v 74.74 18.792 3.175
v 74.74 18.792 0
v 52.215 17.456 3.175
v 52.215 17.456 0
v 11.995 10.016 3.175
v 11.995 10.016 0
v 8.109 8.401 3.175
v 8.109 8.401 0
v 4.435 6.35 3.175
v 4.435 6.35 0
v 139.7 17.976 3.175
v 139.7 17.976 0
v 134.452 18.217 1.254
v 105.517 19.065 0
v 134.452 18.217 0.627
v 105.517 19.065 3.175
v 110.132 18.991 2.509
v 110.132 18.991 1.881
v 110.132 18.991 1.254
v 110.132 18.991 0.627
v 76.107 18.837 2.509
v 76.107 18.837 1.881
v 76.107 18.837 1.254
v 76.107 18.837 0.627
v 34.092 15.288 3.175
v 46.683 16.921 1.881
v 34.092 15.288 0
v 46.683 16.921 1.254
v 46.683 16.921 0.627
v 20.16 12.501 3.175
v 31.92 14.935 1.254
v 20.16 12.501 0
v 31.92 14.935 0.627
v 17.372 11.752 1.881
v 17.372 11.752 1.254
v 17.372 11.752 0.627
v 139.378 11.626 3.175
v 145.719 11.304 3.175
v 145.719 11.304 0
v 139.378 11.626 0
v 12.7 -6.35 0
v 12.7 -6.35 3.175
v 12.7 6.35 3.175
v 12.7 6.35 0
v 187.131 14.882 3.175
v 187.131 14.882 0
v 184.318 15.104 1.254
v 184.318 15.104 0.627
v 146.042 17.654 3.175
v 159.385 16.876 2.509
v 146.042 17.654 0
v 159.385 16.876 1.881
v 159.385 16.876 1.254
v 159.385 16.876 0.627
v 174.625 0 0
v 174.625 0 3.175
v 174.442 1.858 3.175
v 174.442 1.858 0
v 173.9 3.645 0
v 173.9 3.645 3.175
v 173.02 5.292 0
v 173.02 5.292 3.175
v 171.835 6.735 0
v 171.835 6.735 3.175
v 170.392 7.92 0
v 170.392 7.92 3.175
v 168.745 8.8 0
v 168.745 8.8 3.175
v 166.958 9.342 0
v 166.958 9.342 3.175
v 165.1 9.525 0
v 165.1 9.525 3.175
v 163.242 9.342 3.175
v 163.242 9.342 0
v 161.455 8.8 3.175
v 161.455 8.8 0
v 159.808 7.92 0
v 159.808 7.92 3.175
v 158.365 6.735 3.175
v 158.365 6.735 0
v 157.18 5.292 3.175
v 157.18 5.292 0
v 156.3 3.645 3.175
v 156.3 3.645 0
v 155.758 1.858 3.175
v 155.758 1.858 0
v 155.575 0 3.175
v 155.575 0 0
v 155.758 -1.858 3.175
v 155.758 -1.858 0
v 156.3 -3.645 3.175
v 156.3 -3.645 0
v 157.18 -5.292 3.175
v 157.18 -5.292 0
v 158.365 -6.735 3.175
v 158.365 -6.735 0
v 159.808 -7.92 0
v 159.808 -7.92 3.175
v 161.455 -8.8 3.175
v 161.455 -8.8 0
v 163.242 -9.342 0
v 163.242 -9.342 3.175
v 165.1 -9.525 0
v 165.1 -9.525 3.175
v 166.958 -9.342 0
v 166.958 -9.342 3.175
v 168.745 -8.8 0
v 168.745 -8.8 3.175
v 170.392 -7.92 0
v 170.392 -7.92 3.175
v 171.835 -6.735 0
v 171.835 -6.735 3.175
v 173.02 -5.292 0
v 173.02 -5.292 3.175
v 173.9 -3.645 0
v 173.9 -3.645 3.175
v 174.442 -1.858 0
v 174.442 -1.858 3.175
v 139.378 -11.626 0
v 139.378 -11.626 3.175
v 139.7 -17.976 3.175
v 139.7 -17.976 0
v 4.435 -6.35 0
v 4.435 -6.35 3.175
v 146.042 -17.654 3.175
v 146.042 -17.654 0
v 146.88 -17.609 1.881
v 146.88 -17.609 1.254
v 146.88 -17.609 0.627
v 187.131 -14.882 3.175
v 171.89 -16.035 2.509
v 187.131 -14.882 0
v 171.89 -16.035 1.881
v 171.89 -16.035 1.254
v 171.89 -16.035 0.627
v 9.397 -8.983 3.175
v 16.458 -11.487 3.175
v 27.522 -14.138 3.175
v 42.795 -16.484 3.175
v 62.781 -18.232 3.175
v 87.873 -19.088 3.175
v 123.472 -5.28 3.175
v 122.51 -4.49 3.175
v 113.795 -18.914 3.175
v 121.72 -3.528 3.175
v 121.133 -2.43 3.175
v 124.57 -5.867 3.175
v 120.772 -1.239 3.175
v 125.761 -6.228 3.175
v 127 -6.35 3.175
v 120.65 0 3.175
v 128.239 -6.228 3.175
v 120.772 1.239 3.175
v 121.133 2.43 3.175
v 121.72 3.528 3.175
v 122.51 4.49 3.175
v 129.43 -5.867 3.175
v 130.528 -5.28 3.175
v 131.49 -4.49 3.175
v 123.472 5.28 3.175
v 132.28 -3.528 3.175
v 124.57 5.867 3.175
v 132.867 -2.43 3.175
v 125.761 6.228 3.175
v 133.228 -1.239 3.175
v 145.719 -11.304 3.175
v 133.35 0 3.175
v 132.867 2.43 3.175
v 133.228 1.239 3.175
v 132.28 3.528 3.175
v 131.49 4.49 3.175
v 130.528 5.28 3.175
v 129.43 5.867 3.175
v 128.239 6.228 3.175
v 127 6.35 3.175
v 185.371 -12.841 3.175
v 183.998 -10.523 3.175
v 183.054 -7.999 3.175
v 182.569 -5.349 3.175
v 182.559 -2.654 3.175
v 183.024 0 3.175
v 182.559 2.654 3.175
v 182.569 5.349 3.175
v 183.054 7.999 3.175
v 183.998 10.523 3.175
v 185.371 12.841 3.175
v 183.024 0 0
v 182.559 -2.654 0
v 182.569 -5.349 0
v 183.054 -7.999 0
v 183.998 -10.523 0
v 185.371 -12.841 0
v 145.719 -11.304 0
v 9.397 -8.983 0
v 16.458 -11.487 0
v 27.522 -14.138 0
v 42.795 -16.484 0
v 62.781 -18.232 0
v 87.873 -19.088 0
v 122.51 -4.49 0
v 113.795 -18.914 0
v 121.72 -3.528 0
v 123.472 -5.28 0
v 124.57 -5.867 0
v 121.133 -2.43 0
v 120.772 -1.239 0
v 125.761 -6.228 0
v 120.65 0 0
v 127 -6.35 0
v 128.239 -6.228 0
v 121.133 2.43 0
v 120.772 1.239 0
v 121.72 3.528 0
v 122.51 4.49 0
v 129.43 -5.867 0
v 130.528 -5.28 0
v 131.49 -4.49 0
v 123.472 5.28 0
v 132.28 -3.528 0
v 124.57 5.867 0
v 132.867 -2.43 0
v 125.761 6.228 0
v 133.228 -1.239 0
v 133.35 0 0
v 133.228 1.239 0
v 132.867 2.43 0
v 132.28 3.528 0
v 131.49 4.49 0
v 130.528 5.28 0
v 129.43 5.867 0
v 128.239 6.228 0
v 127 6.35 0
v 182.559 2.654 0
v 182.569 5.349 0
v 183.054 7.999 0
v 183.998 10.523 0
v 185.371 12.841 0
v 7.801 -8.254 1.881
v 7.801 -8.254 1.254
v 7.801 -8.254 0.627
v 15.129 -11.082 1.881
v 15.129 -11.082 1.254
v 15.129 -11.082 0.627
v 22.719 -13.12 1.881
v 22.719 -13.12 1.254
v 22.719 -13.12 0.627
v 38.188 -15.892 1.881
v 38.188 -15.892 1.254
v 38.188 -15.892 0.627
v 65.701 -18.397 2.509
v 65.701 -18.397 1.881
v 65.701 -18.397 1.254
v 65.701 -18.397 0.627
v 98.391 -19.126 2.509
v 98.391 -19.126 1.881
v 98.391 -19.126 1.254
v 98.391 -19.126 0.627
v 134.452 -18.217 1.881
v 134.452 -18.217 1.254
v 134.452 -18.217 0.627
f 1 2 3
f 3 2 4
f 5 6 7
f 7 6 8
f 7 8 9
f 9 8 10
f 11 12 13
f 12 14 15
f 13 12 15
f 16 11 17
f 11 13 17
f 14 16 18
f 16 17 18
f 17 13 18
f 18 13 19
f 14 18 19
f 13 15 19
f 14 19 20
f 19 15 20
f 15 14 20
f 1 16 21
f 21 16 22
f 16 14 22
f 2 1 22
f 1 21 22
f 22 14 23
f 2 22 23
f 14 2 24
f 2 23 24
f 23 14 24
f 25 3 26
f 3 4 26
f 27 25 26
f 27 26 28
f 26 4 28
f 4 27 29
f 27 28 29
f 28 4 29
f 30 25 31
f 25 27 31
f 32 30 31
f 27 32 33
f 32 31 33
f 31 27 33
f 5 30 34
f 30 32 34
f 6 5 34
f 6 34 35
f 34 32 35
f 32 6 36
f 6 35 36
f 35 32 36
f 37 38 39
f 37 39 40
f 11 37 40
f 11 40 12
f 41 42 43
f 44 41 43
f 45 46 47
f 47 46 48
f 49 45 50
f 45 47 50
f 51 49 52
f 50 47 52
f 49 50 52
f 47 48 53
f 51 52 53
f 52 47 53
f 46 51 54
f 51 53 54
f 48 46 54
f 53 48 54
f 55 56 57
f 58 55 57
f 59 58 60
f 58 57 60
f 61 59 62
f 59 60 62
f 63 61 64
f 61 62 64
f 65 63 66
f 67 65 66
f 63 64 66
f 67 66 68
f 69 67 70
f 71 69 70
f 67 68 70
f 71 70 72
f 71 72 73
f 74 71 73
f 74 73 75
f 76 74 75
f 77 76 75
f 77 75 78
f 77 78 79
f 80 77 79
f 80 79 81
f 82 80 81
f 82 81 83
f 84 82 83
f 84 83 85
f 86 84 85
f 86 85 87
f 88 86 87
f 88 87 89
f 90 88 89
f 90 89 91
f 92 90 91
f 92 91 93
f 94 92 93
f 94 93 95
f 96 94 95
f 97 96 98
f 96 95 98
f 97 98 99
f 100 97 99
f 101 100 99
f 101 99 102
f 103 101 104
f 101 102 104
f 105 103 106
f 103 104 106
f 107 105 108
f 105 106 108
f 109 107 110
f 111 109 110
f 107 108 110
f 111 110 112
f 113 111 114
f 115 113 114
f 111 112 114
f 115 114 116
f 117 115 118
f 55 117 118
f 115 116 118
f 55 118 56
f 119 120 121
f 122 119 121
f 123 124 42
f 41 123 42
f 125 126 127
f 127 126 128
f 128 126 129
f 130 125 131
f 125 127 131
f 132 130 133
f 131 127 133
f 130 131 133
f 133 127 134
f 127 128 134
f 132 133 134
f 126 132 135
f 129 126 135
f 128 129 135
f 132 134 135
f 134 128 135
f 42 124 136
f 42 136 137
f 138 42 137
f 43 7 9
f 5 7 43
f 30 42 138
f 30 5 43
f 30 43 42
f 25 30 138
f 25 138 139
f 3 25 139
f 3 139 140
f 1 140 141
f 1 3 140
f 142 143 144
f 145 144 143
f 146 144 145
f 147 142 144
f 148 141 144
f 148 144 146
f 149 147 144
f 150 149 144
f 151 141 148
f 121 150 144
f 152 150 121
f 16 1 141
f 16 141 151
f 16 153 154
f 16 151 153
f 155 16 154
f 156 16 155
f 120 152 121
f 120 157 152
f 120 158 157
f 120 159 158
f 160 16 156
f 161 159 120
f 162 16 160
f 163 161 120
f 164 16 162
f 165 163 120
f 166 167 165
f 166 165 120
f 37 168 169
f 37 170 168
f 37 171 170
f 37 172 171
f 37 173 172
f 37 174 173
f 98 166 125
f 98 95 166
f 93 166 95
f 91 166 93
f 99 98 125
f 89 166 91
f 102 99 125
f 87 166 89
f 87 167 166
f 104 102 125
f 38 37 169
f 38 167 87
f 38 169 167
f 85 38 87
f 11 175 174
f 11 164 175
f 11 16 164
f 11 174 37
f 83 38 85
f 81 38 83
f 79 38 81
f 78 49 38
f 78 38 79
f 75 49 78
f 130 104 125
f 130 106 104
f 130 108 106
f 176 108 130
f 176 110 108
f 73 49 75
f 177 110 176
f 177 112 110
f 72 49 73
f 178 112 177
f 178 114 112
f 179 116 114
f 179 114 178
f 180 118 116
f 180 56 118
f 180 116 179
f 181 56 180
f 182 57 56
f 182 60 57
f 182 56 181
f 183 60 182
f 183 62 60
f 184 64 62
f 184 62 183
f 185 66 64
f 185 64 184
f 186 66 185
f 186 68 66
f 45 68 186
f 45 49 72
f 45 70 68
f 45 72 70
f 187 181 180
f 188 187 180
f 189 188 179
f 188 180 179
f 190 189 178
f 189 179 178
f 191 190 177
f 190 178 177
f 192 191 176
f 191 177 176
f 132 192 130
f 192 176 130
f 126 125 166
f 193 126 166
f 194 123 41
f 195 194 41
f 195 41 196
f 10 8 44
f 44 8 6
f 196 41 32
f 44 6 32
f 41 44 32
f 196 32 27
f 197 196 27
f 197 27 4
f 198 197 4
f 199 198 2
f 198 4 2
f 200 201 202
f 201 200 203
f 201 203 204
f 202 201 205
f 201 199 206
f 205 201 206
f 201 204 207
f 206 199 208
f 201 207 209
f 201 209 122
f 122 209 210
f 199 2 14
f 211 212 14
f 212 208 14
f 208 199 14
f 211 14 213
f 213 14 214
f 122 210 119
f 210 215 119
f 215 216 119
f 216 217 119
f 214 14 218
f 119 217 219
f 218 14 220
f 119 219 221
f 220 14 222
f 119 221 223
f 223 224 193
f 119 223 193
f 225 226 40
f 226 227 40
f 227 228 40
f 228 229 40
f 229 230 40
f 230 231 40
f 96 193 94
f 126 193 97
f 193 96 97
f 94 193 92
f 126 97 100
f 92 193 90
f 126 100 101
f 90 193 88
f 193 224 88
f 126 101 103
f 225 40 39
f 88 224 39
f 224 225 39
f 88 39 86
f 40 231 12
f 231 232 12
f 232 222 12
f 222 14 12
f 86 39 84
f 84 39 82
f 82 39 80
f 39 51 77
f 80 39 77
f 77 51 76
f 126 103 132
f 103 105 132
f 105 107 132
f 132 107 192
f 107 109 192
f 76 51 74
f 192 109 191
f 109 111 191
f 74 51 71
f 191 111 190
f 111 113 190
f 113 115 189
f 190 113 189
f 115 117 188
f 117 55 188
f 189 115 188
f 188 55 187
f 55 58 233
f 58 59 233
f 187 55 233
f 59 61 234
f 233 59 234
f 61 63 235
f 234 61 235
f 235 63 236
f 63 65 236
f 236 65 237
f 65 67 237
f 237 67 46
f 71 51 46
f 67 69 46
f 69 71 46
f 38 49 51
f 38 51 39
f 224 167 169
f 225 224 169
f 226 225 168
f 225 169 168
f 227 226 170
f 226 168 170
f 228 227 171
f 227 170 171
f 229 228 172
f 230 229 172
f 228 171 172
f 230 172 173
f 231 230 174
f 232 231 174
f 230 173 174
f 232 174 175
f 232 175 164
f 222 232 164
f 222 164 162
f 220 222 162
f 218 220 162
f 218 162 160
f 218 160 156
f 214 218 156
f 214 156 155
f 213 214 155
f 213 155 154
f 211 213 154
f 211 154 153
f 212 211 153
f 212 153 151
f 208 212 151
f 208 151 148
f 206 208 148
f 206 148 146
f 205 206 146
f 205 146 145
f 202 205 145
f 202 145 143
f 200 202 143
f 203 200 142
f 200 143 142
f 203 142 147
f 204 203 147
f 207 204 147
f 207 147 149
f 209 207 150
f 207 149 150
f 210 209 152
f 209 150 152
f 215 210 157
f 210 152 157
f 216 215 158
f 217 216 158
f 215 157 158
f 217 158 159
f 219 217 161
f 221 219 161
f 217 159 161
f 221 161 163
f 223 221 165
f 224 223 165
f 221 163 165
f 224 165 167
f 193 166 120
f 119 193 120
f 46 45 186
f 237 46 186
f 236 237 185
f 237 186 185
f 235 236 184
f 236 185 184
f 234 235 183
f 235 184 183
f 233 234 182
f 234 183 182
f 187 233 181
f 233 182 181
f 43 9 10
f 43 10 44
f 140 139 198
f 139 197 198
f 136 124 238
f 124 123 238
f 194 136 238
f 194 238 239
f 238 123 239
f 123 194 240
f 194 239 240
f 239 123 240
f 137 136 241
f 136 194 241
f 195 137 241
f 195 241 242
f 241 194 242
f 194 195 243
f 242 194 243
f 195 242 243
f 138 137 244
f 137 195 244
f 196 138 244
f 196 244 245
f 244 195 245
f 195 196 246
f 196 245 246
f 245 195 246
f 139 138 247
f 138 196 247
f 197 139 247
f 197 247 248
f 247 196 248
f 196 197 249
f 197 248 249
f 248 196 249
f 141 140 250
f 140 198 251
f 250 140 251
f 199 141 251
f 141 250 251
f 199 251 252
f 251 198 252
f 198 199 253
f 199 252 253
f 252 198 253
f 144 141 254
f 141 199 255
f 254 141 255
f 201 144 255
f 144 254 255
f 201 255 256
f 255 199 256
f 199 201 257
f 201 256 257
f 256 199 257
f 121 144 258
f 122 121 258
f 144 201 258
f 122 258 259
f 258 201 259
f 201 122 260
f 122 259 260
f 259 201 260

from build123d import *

# Parameters (mm, degrees)
BOSS_EXTRUDE1_DEPTH = 3.175
SKETCH3_R           = 6.35
CUT_EXTRUDE1_DEPTH  = 4.1750001
SKETCH4_W           = 12.7
SKETCH4_H           = 12.7
CUT_EXTRUDE2_DEPTH  = 4.1750001
CUT_EXTRUDE3_DEPTH  = 4.1750001
SKETCH9_R           = 9.525
CUT_EXTRUDE5_DEPTH  = 5.08


with BuildPart() as part:
    # Sketch2 → Boss-Extrude1 (new body)
    with BuildSketch(Plane.XY):
        with BuildLine():
            add(Edge.make_bspline(
                [(318.77, 0.4016502), (318.651672051, 0.500810625), (317.887139521, 0.407183952), (316.525702267, 0.790429835), (314.029007456, 1.027310814), (310.665580368, 1.535686456), (306.332982445, 2.102999714), (301.108142881, 2.802187224), (295.00465514, 3.592552282), (288.066717306, 4.4725213), (280.334877508, 5.426678676), (271.857503414, 6.442111261), (262.686702585, 7.506224727), (252.87894916, 8.604531435), (242.494745532, 9.723621949), (231.598187206, 10.849597023), (220.25642858, 11.967923085), (208.539426289, 13.062902197), (196.51933871, 14.120159542), (184.270405083, 15.122019671), (171.867889749, 16.052147213), (159.388371015, 16.893273609), (146.908740176, 17.627811631), (134.505824677, 18.237204103), (122.256224526, 18.705201007), (110.2351092, 19.016534527), (98.516766738, 19.155997955), (87.173201506, 19.112523415), (76.274349541, 18.877713447), (65.887298252, 18.445615875), (56.075981931, 17.815100401), (46.900701285, 16.988064202), (38.417602501, 15.970966467), (30.678392783, 14.772461193), (23.72996987, 13.405065743), (17.613059426, 11.884241622), (12.362420389, 10.224818762), (8.00472945, 8.442252382), (4.553883407, 6.548602381), (2.01519229, 4.54013128), (0.389181285, 2.368249597), (-0.181372316, 0), (0.389181285, -2.368249597), (2.01519229, -4.54013128), (4.553883407, -6.548602381), (8.00472945, -8.442252382), (12.362420389, -10.224818762), (17.613059426, -11.884241622), (23.72996987, -13.405065743), (30.678392783, -14.772461193), (38.417602501, -15.970966467), (46.900701285, -16.988064202), (56.075981931, -17.815100401), (65.887298252, -18.445615875), (76.274349541, -18.877713447), (87.173201506, -19.112523415), (98.516766738, -19.155997955), (110.2351092, -19.016534527), (122.256224526, -18.705201007), (134.505824677, -18.237204103), (146.908740176, -17.627811631), (159.388371015, -16.893273609), (171.867889749, -16.052147213), (184.270405083, -15.122019671), (196.51933871, -14.120159542), (208.539426289, -13.062902197), (220.25642858, -11.967923085), (231.598187206, -10.849597023), (242.494745532, -9.723621949), (252.87894916, -8.604531435), (262.686702585, -7.506224727), (271.857503414, -6.442111261), (280.334877508, -5.426678676), (288.066717306, -4.4725213), (295.00465514, -3.592552282), (301.108142881, -2.802187224), (306.332982445, -2.102999714), (310.665580368, -1.535686456), (314.029007456, -1.027310814), (316.525702267, -0.790429835), (317.887139521, -0.407183952), (318.96162857, -0.538768719), (318.96162857, 0.241062861), (318.77, 0.4016502)],
                knots=[0, 0, 0, 0, 0.000762215, 0.003044706, 0.006832246, 0.012101176, 0.018817536, 0.026939455, 0.036414848, 0.047184629, 0.059180413, 0.072327874, 0.086544061, 0.10174058, 0.117823336, 0.134691452, 0.152240154, 0.17036129, 0.188941008, 0.207865435, 0.227016078, 0.246275696, 0.265524943, 0.284644966, 0.303520118, 0.322034575, 0.340078353, 0.357542593, 0.374325482, 0.390329891, 0.40546389, 0.419643801, 0.432793371, 0.444843817, 0.455737921, 0.465428653, 0.47388632, 0.481101634, 0.487101684, 0.491975368, 0.495930678, 0.499382808, 0.502834938, 0.506790248, 0.511663932, 0.517663982, 0.524879296, 0.533336963, 0.543027695, 0.553921799, 0.565972245, 0.579121815, 0.593301726, 0.608435725, 0.624440134, 0.641223023, 0.658687263, 0.676731041, 0.695245498, 0.71412065, 0.733240673, 0.75248992, 0.771749538, 0.790900181, 0.809824608, 0.828404326, 0.846525462, 0.864074164, 0.88094228, 0.897025036, 0.912221555, 0.926437743, 0.939585203, 0.951580988, 0.962350768, 0.971826161, 0.979948081, 0.98666444, 0.991933371, 0.99572091, 0.998003402, 0.998765616, 1, 1, 1, 1], degree=3))
        make_face()
    extrude(amount=BOSS_EXTRUDE1_DEPTH)

    # Sketch3 → Cut-Extrude1 (cut, through all)
    with BuildSketch(Plane.XY.offset(3.175)):
        with Locations((127, 0)):
            Circle(SKETCH3_R)
        Polygon((146.041832216, 17.654123083), (145.719448384, 11.304123083), (139.377616168, 11.626092244), (139.7, 17.976092244), (139.972135492, 23.336349817), (146.313967709, 23.014380656), align=None)
        Polygon((145.719448384, -11.304123083), (139.377616168, -11.626092244), (139.7, -17.976092244), (139.876824838, -21.459014187), (146.218657054, -21.137045026), (146.041832216, -17.654123083), align=None)
    extrude(amount=-CUT_EXTRUDE1_DEPTH, mode=Mode.SUBTRACT)

    # Sketch4 → Cut-Extrude2 (cut, through all)
    with BuildSketch(Plane.XY.offset(3.175)):
        with Locations((6.35, 0)):
            Rectangle(SKETCH4_W, SKETCH4_H)
    extrude(amount=-CUT_EXTRUDE2_DEPTH, mode=Mode.SUBTRACT)

    # Sketch5 → Cut-Extrude3 (cut, through all)
    with BuildSketch(Plane.XY.offset(3.175)):
        with BuildLine():
            Line((188.763328764, 17.093497057), (187.34983048, 15.089350861))
            ThreePointArc((187.34983048, 15.089350861), (183.094624601, 8.144494137), (183.023721428, 0))
            ThreePointArc((183.023721428, 0), (183.072311074, -8.06586998), (187.230894162, -14.977223407))
            Line((187.230894162, -14.977223407), (188.588975382, -18.075111724))
            add(Edge.make_bspline(
                [(188.588975382, -18.075111724), (191.824355535, -17.830310957), (199.841087156, -17.206236773), (212.516511905, -16.154636366), (226.466564745, -14.920704924), (239.970203835, -13.65677605), (252.944086016, -12.381118049), (265.308209748, -11.110630122), (276.986217406, -9.861474653), (287.906030173, -8.649252334), (298.000356614, -7.490870717), (307.207112828, -6.401010018), (315.468663619, -5.394751924), (322.736664519, -4.490202252), (328.958509167, -3.688972861), (334.117780822, -3.039413883), (338.123361689, -2.454274616), (341.095902765, -2.187108839), (342.718315982, -1.739066598), (343.996214648, -1.901995728), (344.002571846, -0.619693067), (342.723120546, -0.769943771), (341.105229436, -0.305837259), (338.135483436, -0.009211749), (334.135901144, 0.615614253), (328.983323498, 1.316295691), (322.769728908, 2.179175541), (315.511053915, 3.155743275), (307.259886312, 4.24386552), (298.064388673, 5.42495801), (287.982043821, 6.683368345), (277.074787054, 8.003801467), (265.409738858, 9.368683456), (253.058819828, 10.761699723), (240.098223582, 12.165931591), (226.607780172, 13.563687468), (212.670647531, 14.9358736), (200.006272506, 16.113099669), (191.996122671, 16.816629398), (188.763328764, 17.093497057)],
                knots=[0.797255798, 0.797255798, 0.797255798, 0.797255798, 0.809824608, 0.828404326, 0.846525462, 0.864074164, 0.88094228, 0.897025036, 0.912221555, 0.926437743, 0.939585203, 0.951580988, 0.962350768, 0.971826161, 0.979948081, 0.98666444, 0.991933371, 0.99572091, 0.998003402, 0.998765616, 1, 1.000762215, 1.003044706, 1.006832246, 1.012101176, 1.018817536, 1.026939455, 1.036414848, 1.047184629, 1.059180413, 1.072327874, 1.086544061, 1.10174058, 1.117823336, 1.134691452, 1.152240154, 1.17036129, 1.188941008, 1.201509818, 1.201509818, 1.201509818, 1.201509818], degree=3))
        make_face()
    extrude(amount=-CUT_EXTRUDE3_DEPTH, mode=Mode.SUBTRACT)

    # Sketch9 → Cut-Extrude5 (cut)
    with BuildSketch(Plane.XY.offset(3.175)):
        with Locations((165.1, 0)):
            Circle(SKETCH9_R)
    extrude(amount=-CUT_EXTRUDE5_DEPTH, mode=Mode.SUBTRACT)


solid = part.part
